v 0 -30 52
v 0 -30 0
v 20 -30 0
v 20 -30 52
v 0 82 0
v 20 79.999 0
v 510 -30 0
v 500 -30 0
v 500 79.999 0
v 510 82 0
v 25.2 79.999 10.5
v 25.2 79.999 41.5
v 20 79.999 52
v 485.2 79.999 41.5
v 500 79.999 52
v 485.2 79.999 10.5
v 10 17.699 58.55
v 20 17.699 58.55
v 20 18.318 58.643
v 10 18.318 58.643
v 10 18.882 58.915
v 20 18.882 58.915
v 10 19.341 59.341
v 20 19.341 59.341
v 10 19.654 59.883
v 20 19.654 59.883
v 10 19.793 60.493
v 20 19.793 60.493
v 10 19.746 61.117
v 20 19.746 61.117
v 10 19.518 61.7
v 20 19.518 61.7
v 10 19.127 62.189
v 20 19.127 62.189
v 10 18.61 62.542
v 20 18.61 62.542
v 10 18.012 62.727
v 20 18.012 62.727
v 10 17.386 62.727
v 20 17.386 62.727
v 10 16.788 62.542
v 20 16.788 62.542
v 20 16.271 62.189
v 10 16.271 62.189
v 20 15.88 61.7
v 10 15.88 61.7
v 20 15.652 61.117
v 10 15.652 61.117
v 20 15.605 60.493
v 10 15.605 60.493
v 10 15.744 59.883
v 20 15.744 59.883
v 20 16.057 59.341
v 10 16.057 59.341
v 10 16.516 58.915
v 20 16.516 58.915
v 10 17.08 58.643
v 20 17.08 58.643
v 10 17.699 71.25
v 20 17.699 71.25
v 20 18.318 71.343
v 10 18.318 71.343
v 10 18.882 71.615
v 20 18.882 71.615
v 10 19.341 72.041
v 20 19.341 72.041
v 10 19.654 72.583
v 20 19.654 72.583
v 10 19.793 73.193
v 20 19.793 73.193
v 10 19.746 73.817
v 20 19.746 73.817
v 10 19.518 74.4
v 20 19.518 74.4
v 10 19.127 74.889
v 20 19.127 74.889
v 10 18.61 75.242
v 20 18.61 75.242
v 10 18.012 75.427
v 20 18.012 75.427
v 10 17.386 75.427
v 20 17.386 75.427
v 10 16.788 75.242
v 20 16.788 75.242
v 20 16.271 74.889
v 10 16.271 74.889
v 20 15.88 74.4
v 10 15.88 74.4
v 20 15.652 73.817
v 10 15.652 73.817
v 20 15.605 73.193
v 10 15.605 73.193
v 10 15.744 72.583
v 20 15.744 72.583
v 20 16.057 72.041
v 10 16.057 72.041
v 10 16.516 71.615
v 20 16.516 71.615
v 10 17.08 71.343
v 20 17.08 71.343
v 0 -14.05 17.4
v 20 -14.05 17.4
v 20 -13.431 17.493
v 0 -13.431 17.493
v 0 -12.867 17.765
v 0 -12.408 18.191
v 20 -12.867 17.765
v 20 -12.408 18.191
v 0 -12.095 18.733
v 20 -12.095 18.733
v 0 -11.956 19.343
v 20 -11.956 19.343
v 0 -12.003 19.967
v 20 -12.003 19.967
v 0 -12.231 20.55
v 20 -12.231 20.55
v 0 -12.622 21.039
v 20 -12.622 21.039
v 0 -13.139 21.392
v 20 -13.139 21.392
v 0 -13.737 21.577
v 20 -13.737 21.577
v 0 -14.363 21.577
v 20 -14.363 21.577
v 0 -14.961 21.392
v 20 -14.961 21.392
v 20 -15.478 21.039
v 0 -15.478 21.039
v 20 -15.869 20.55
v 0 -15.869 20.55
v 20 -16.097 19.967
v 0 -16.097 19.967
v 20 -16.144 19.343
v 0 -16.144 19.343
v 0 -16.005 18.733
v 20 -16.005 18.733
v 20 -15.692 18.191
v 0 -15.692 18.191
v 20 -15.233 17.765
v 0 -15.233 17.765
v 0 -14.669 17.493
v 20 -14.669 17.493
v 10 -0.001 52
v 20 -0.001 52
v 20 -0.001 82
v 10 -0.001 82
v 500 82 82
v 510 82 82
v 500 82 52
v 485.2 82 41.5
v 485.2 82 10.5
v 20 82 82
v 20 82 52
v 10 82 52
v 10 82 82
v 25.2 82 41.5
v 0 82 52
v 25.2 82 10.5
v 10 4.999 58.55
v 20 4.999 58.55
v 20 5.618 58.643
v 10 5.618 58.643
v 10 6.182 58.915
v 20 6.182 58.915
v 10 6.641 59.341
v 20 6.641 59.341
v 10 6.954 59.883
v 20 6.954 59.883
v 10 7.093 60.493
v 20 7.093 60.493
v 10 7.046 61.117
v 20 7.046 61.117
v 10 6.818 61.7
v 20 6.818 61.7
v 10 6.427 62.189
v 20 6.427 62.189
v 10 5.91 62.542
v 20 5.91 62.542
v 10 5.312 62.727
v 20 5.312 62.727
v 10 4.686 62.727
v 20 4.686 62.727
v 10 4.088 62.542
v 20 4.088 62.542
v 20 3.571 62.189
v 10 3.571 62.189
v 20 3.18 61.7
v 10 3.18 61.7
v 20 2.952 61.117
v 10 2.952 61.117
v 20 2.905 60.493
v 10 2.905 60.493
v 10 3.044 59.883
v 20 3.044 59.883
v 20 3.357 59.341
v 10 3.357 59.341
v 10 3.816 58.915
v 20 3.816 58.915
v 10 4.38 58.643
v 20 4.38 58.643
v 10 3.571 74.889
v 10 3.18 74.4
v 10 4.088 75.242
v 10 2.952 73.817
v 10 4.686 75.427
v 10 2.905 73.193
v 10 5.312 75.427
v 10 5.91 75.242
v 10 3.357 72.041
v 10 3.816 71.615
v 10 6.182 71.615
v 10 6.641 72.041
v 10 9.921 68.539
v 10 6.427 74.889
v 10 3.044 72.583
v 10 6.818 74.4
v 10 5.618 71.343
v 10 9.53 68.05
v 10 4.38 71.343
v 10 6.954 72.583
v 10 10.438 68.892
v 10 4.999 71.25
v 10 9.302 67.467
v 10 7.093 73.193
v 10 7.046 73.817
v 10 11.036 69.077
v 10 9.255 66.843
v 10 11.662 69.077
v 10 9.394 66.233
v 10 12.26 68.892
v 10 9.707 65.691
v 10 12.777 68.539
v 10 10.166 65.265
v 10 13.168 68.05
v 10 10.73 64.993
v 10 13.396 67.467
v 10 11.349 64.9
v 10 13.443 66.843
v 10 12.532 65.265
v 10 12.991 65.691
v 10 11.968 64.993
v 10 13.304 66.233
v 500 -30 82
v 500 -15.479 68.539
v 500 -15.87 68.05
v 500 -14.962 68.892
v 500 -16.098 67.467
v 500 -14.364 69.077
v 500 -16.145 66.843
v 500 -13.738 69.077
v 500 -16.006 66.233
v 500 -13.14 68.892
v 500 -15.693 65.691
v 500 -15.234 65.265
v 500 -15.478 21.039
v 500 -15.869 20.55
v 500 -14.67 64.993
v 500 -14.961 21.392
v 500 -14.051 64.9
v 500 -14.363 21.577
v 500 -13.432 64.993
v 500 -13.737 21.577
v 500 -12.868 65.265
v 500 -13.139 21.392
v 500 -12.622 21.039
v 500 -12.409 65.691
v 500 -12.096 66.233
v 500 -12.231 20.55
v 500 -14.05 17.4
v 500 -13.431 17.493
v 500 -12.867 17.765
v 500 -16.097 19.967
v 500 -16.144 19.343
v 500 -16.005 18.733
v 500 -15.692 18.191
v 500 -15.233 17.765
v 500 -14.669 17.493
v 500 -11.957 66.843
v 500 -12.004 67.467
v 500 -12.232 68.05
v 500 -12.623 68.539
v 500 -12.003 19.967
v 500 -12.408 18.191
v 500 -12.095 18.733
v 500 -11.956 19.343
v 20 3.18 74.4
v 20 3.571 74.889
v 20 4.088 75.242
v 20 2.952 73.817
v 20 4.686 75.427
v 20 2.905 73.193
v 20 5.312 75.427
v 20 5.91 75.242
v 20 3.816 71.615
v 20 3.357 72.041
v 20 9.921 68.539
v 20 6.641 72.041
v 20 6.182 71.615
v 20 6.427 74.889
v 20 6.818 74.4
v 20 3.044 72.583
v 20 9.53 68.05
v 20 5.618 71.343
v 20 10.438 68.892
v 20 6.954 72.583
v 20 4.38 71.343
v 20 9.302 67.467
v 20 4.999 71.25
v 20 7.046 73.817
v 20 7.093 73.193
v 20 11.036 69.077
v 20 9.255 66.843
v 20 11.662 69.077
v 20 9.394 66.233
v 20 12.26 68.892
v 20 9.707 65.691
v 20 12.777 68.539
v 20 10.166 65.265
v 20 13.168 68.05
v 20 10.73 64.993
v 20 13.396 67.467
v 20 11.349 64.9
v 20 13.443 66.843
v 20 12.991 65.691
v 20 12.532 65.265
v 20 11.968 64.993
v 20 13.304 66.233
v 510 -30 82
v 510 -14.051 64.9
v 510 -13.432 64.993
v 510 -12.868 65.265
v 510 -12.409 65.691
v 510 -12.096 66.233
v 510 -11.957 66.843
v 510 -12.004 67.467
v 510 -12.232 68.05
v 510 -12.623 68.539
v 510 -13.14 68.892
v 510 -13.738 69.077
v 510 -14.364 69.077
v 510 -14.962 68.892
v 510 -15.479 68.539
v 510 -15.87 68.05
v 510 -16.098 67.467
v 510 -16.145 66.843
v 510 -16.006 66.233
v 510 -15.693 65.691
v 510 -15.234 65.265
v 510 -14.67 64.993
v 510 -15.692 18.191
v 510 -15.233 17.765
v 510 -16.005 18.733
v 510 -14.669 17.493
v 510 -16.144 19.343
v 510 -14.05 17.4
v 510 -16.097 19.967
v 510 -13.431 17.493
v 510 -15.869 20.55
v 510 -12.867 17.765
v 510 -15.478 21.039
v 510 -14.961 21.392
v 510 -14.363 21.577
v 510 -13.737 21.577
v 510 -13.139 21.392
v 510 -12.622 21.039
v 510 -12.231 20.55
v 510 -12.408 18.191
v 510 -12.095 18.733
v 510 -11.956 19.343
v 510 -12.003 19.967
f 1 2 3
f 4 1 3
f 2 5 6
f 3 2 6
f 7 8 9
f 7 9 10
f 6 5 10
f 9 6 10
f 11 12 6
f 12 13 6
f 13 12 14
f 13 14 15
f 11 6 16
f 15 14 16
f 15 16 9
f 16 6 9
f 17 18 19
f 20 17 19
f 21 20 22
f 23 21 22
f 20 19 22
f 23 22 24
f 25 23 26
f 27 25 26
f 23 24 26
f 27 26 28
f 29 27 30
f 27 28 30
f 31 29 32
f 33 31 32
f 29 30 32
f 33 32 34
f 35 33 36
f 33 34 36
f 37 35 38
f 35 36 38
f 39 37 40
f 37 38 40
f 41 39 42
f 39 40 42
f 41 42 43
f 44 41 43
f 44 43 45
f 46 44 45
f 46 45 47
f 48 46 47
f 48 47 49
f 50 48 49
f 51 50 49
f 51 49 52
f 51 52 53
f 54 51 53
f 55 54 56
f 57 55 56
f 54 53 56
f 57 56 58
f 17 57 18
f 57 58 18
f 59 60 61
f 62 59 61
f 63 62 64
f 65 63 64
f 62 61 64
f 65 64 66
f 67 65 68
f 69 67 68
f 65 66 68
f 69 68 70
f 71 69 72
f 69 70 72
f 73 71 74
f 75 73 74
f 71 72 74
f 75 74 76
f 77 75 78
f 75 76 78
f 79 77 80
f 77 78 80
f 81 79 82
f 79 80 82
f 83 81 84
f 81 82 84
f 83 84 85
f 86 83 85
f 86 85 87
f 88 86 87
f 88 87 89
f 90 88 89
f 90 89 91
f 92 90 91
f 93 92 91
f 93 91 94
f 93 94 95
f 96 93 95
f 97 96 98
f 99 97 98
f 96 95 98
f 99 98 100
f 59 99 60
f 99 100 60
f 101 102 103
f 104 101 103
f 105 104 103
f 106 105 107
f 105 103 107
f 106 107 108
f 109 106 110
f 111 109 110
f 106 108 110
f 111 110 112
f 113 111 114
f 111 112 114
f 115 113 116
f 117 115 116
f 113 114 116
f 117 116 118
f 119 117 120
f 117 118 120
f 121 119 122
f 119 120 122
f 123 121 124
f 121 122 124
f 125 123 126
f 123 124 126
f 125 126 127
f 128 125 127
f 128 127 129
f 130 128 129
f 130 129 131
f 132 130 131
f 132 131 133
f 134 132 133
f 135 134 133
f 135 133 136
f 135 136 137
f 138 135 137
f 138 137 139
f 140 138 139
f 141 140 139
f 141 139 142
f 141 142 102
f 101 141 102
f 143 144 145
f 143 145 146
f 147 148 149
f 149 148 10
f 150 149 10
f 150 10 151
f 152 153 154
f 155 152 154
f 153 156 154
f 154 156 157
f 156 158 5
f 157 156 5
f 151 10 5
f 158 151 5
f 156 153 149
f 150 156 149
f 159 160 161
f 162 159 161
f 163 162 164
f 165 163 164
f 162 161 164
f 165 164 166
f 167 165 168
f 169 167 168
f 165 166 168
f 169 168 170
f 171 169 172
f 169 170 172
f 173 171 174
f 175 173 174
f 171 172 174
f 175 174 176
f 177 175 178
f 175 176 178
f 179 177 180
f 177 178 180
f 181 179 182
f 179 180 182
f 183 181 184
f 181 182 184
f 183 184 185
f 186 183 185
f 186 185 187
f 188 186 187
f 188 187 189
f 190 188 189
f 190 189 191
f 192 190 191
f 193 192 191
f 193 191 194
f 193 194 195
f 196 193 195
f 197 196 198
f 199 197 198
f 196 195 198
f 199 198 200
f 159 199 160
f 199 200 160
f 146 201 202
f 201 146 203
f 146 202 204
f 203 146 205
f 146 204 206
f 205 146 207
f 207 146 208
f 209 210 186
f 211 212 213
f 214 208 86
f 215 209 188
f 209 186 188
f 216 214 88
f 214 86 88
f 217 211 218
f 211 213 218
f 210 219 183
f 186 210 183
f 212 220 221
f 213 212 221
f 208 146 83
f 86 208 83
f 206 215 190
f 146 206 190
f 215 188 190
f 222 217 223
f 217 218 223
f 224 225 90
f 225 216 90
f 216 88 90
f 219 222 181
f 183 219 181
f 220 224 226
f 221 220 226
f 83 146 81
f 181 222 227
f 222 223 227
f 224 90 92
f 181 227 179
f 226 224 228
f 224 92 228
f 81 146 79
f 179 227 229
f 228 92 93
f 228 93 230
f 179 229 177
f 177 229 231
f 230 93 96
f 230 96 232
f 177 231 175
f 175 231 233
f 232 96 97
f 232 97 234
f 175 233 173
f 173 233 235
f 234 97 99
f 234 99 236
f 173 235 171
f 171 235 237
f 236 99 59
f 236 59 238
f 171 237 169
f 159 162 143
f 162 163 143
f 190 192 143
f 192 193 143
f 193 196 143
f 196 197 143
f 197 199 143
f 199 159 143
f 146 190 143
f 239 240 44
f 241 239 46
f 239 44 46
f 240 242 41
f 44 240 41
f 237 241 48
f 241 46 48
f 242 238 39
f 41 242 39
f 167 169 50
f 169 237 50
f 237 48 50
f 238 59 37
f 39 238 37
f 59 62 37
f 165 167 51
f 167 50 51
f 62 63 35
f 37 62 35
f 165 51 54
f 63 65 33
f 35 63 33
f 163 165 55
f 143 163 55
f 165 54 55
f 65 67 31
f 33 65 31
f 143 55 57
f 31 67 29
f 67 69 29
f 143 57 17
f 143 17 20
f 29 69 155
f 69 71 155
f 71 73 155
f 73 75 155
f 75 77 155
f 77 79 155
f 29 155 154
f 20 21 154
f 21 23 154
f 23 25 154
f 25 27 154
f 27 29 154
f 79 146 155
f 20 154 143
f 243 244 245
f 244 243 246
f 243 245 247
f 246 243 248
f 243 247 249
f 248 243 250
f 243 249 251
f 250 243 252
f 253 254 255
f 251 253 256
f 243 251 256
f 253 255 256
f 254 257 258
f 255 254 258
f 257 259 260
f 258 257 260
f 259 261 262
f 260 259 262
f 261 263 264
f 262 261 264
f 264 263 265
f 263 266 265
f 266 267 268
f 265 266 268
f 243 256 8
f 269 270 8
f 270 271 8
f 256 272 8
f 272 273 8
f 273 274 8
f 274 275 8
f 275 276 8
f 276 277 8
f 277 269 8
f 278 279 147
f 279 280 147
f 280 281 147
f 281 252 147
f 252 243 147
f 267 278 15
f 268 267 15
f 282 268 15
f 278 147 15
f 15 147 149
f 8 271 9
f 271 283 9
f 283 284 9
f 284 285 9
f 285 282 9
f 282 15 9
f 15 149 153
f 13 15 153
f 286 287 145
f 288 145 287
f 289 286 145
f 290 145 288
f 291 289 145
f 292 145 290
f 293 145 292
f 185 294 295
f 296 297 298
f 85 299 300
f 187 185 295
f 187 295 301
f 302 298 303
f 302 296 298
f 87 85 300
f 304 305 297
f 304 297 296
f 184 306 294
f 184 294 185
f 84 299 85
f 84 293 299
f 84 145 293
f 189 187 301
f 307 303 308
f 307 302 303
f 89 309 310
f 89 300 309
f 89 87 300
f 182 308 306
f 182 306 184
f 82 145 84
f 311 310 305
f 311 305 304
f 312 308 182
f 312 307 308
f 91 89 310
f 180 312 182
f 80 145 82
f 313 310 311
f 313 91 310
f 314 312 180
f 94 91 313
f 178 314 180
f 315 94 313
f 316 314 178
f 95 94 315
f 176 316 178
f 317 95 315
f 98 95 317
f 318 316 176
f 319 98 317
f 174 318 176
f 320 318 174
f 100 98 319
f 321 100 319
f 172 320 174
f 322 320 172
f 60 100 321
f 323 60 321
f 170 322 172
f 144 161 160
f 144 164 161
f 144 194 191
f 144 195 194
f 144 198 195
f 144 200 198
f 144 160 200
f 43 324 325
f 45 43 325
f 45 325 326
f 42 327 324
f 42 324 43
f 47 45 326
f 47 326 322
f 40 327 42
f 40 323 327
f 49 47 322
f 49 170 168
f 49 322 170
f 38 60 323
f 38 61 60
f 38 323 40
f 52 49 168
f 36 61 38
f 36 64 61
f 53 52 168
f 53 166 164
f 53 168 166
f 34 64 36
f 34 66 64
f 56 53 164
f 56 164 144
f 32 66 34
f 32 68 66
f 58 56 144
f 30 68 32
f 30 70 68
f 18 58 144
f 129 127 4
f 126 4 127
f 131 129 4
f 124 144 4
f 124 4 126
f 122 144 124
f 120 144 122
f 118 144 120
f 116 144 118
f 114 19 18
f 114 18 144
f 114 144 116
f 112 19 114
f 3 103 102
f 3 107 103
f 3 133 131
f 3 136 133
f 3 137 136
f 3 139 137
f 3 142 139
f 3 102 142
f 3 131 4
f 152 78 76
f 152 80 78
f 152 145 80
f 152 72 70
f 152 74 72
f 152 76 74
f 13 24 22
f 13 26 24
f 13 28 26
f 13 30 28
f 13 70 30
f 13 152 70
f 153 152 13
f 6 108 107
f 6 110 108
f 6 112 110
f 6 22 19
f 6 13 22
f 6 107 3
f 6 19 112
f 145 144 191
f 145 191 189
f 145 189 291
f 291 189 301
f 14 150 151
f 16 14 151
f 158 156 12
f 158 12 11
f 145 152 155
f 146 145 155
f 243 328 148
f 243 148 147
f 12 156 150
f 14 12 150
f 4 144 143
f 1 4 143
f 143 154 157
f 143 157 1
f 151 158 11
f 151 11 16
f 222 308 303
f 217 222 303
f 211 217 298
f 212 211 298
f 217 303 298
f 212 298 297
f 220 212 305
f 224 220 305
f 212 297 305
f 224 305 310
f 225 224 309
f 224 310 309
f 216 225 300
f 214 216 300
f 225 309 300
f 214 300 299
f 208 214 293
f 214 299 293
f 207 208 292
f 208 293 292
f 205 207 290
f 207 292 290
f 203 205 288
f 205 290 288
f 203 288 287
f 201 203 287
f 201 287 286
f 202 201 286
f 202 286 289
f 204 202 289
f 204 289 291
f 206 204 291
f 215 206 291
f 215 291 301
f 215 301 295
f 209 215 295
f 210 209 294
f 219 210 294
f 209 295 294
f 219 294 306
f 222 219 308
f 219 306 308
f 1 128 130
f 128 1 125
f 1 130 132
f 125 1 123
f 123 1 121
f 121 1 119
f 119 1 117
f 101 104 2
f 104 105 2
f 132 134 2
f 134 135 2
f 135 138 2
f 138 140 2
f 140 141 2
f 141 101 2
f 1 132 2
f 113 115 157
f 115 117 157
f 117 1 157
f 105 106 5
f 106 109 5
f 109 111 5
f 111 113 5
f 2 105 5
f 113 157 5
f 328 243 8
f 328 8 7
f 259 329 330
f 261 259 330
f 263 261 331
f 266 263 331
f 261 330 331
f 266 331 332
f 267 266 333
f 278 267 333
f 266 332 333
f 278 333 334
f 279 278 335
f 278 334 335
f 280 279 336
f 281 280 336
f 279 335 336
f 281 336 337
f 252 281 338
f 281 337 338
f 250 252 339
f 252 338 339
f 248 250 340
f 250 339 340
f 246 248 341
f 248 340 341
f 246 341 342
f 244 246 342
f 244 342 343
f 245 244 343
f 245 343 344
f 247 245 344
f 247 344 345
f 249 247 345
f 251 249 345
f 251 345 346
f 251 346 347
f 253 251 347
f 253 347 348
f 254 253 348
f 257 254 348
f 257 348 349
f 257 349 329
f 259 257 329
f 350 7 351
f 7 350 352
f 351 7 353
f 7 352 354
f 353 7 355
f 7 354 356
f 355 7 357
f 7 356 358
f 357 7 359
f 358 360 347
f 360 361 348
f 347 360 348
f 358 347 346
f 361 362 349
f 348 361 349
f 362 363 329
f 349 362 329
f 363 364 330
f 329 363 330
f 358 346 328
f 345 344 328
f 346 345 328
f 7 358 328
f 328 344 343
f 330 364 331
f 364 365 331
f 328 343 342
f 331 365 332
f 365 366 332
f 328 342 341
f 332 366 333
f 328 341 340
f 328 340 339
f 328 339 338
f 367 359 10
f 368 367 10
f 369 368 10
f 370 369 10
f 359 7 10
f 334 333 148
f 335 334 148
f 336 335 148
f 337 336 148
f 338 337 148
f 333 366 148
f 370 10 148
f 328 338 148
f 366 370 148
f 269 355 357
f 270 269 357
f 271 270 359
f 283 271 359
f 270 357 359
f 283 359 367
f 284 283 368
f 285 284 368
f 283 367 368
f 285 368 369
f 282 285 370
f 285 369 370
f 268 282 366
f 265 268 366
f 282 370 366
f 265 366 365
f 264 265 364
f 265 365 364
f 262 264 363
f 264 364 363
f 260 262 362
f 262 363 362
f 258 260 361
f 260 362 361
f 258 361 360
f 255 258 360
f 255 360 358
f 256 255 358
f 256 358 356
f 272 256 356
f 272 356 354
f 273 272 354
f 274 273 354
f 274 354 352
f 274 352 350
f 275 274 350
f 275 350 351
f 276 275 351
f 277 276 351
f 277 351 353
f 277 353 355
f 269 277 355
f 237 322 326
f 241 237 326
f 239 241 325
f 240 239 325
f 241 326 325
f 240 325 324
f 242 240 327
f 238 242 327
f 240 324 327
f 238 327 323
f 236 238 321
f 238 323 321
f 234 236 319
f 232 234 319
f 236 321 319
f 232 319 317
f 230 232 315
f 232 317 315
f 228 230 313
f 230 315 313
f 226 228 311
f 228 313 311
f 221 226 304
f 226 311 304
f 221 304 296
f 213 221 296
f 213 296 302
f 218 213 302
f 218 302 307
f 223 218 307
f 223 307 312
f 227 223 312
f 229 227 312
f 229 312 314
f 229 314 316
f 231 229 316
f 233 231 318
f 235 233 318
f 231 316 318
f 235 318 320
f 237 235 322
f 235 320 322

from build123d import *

# Parameters (mm, degrees)
BOSS_EXTRUDE1_DEPTH      = 82
BOSS_EXTRUDE1_DEPTH_BACK = 0.001
SKETCH2_W                = 480
SKETCH2_H                = 80
CUT_EXTRUDE2_DEPTH       = 82
SKETCH3_W                = 20
SKETCH3_H                = 52
SKETCH3_W_2              = 10
SKETCH3_H_2              = 82
BOSS_EXTRUDE3_DEPTH      = 30
SKETCH4_R                = 2.1
CUT_EXTRUDE3_DEPTH       = 618
SKETCH5_W                = 460.000000001
SKETCH5_H                = 31
CUT_EXTRUDE4_DEPTH       = 42
SKETCH6_R                = 2.1
CUT_EXTRUDE5_DEPTH       = 10


with BuildPart() as part:
    # Sketch1 → Boss-Extrude1 (new body, two sides)
    with BuildSketch(Plane(origin=(0, 0, 0), x_dir=(1, 0, 0), z_dir=(0, 1, 0))) as boss_extrude1_sk:
        Polygon((10, -82), (10, -52), (0, -52), (0, 0), (510, 0), (510, -82), (500, -82), (500, -52), (20, -52), (20, -82), align=None)
    extrude(amount=BOSS_EXTRUDE1_DEPTH)
    extrude(boss_extrude1_sk.sketch, amount=-BOSS_EXTRUDE1_DEPTH_BACK)

    # Sketch2 → Cut-Extrude2 (cut)
    with BuildSketch(Plane.XY):
        with Locations((260, 39.999)):
            Rectangle(SKETCH2_W, SKETCH2_H)
    extrude(amount=CUT_EXTRUDE2_DEPTH, mode=Mode.SUBTRACT)

    # Sketch3 → Boss-Extrude3 (add)
    with BuildSketch(Plane(origin=(0, 0, 0), x_dir=(1, 0, 0), z_dir=(0, 1, 0))):
        with Locations((10, -26)):
            Rectangle(SKETCH3_W, SKETCH3_H)
        with Locations((505, -41)):
            Rectangle(SKETCH3_W_2, SKETCH3_H_2)
    extrude(amount=-BOSS_EXTRUDE3_DEPTH)

    # Sketch4 → Cut-Extrude3 (cut)
    with BuildSketch(Plane(origin=(510, 0, 0), x_dir=(0, 0, -1), z_dir=(1, 0, 0))):
        with Locations((-67, -14.051)):
            Circle(SKETCH4_R)
        with Locations((-19.50000001, -14.05)):
            Circle(SKETCH4_R)
    extrude(amount=-CUT_EXTRUDE3_DEPTH, mode=Mode.SUBTRACT)

    # Sketch5 → Cut-Extrude4 (cut)
    with BuildSketch(Plane(origin=(0, 82, 0), x_dir=(1, 0, 0), z_dir=(0, 1, 0))):
        with Locations((255.200000001, -26)):
            Rectangle(SKETCH5_W, SKETCH5_H)
    extrude(amount=-CUT_EXTRUDE4_DEPTH, mode=Mode.SUBTRACT)

    # Sketch6 → Cut-Extrude5 (cut)
    with BuildSketch(Plane(origin=(20, 0, 0), x_dir=(0, 0, -1), z_dir=(1, 0, 0))):
        with Locations((-67, 11.349)):
            Circle(SKETCH6_R)
        with Locations((-60.65, 17.699)):
            Circle(SKETCH6_R)
        with Locations((-73.35, 17.699)):
            Circle(SKETCH6_R)
        with Locations((-73.35, 4.999)):
            Circle(SKETCH6_R)
        with Locations((-60.65, 4.999)):
            Circle(SKETCH6_R)
    extrude(amount=-CUT_EXTRUDE5_DEPTH, mode=Mode.SUBTRACT)


solid = part.part
